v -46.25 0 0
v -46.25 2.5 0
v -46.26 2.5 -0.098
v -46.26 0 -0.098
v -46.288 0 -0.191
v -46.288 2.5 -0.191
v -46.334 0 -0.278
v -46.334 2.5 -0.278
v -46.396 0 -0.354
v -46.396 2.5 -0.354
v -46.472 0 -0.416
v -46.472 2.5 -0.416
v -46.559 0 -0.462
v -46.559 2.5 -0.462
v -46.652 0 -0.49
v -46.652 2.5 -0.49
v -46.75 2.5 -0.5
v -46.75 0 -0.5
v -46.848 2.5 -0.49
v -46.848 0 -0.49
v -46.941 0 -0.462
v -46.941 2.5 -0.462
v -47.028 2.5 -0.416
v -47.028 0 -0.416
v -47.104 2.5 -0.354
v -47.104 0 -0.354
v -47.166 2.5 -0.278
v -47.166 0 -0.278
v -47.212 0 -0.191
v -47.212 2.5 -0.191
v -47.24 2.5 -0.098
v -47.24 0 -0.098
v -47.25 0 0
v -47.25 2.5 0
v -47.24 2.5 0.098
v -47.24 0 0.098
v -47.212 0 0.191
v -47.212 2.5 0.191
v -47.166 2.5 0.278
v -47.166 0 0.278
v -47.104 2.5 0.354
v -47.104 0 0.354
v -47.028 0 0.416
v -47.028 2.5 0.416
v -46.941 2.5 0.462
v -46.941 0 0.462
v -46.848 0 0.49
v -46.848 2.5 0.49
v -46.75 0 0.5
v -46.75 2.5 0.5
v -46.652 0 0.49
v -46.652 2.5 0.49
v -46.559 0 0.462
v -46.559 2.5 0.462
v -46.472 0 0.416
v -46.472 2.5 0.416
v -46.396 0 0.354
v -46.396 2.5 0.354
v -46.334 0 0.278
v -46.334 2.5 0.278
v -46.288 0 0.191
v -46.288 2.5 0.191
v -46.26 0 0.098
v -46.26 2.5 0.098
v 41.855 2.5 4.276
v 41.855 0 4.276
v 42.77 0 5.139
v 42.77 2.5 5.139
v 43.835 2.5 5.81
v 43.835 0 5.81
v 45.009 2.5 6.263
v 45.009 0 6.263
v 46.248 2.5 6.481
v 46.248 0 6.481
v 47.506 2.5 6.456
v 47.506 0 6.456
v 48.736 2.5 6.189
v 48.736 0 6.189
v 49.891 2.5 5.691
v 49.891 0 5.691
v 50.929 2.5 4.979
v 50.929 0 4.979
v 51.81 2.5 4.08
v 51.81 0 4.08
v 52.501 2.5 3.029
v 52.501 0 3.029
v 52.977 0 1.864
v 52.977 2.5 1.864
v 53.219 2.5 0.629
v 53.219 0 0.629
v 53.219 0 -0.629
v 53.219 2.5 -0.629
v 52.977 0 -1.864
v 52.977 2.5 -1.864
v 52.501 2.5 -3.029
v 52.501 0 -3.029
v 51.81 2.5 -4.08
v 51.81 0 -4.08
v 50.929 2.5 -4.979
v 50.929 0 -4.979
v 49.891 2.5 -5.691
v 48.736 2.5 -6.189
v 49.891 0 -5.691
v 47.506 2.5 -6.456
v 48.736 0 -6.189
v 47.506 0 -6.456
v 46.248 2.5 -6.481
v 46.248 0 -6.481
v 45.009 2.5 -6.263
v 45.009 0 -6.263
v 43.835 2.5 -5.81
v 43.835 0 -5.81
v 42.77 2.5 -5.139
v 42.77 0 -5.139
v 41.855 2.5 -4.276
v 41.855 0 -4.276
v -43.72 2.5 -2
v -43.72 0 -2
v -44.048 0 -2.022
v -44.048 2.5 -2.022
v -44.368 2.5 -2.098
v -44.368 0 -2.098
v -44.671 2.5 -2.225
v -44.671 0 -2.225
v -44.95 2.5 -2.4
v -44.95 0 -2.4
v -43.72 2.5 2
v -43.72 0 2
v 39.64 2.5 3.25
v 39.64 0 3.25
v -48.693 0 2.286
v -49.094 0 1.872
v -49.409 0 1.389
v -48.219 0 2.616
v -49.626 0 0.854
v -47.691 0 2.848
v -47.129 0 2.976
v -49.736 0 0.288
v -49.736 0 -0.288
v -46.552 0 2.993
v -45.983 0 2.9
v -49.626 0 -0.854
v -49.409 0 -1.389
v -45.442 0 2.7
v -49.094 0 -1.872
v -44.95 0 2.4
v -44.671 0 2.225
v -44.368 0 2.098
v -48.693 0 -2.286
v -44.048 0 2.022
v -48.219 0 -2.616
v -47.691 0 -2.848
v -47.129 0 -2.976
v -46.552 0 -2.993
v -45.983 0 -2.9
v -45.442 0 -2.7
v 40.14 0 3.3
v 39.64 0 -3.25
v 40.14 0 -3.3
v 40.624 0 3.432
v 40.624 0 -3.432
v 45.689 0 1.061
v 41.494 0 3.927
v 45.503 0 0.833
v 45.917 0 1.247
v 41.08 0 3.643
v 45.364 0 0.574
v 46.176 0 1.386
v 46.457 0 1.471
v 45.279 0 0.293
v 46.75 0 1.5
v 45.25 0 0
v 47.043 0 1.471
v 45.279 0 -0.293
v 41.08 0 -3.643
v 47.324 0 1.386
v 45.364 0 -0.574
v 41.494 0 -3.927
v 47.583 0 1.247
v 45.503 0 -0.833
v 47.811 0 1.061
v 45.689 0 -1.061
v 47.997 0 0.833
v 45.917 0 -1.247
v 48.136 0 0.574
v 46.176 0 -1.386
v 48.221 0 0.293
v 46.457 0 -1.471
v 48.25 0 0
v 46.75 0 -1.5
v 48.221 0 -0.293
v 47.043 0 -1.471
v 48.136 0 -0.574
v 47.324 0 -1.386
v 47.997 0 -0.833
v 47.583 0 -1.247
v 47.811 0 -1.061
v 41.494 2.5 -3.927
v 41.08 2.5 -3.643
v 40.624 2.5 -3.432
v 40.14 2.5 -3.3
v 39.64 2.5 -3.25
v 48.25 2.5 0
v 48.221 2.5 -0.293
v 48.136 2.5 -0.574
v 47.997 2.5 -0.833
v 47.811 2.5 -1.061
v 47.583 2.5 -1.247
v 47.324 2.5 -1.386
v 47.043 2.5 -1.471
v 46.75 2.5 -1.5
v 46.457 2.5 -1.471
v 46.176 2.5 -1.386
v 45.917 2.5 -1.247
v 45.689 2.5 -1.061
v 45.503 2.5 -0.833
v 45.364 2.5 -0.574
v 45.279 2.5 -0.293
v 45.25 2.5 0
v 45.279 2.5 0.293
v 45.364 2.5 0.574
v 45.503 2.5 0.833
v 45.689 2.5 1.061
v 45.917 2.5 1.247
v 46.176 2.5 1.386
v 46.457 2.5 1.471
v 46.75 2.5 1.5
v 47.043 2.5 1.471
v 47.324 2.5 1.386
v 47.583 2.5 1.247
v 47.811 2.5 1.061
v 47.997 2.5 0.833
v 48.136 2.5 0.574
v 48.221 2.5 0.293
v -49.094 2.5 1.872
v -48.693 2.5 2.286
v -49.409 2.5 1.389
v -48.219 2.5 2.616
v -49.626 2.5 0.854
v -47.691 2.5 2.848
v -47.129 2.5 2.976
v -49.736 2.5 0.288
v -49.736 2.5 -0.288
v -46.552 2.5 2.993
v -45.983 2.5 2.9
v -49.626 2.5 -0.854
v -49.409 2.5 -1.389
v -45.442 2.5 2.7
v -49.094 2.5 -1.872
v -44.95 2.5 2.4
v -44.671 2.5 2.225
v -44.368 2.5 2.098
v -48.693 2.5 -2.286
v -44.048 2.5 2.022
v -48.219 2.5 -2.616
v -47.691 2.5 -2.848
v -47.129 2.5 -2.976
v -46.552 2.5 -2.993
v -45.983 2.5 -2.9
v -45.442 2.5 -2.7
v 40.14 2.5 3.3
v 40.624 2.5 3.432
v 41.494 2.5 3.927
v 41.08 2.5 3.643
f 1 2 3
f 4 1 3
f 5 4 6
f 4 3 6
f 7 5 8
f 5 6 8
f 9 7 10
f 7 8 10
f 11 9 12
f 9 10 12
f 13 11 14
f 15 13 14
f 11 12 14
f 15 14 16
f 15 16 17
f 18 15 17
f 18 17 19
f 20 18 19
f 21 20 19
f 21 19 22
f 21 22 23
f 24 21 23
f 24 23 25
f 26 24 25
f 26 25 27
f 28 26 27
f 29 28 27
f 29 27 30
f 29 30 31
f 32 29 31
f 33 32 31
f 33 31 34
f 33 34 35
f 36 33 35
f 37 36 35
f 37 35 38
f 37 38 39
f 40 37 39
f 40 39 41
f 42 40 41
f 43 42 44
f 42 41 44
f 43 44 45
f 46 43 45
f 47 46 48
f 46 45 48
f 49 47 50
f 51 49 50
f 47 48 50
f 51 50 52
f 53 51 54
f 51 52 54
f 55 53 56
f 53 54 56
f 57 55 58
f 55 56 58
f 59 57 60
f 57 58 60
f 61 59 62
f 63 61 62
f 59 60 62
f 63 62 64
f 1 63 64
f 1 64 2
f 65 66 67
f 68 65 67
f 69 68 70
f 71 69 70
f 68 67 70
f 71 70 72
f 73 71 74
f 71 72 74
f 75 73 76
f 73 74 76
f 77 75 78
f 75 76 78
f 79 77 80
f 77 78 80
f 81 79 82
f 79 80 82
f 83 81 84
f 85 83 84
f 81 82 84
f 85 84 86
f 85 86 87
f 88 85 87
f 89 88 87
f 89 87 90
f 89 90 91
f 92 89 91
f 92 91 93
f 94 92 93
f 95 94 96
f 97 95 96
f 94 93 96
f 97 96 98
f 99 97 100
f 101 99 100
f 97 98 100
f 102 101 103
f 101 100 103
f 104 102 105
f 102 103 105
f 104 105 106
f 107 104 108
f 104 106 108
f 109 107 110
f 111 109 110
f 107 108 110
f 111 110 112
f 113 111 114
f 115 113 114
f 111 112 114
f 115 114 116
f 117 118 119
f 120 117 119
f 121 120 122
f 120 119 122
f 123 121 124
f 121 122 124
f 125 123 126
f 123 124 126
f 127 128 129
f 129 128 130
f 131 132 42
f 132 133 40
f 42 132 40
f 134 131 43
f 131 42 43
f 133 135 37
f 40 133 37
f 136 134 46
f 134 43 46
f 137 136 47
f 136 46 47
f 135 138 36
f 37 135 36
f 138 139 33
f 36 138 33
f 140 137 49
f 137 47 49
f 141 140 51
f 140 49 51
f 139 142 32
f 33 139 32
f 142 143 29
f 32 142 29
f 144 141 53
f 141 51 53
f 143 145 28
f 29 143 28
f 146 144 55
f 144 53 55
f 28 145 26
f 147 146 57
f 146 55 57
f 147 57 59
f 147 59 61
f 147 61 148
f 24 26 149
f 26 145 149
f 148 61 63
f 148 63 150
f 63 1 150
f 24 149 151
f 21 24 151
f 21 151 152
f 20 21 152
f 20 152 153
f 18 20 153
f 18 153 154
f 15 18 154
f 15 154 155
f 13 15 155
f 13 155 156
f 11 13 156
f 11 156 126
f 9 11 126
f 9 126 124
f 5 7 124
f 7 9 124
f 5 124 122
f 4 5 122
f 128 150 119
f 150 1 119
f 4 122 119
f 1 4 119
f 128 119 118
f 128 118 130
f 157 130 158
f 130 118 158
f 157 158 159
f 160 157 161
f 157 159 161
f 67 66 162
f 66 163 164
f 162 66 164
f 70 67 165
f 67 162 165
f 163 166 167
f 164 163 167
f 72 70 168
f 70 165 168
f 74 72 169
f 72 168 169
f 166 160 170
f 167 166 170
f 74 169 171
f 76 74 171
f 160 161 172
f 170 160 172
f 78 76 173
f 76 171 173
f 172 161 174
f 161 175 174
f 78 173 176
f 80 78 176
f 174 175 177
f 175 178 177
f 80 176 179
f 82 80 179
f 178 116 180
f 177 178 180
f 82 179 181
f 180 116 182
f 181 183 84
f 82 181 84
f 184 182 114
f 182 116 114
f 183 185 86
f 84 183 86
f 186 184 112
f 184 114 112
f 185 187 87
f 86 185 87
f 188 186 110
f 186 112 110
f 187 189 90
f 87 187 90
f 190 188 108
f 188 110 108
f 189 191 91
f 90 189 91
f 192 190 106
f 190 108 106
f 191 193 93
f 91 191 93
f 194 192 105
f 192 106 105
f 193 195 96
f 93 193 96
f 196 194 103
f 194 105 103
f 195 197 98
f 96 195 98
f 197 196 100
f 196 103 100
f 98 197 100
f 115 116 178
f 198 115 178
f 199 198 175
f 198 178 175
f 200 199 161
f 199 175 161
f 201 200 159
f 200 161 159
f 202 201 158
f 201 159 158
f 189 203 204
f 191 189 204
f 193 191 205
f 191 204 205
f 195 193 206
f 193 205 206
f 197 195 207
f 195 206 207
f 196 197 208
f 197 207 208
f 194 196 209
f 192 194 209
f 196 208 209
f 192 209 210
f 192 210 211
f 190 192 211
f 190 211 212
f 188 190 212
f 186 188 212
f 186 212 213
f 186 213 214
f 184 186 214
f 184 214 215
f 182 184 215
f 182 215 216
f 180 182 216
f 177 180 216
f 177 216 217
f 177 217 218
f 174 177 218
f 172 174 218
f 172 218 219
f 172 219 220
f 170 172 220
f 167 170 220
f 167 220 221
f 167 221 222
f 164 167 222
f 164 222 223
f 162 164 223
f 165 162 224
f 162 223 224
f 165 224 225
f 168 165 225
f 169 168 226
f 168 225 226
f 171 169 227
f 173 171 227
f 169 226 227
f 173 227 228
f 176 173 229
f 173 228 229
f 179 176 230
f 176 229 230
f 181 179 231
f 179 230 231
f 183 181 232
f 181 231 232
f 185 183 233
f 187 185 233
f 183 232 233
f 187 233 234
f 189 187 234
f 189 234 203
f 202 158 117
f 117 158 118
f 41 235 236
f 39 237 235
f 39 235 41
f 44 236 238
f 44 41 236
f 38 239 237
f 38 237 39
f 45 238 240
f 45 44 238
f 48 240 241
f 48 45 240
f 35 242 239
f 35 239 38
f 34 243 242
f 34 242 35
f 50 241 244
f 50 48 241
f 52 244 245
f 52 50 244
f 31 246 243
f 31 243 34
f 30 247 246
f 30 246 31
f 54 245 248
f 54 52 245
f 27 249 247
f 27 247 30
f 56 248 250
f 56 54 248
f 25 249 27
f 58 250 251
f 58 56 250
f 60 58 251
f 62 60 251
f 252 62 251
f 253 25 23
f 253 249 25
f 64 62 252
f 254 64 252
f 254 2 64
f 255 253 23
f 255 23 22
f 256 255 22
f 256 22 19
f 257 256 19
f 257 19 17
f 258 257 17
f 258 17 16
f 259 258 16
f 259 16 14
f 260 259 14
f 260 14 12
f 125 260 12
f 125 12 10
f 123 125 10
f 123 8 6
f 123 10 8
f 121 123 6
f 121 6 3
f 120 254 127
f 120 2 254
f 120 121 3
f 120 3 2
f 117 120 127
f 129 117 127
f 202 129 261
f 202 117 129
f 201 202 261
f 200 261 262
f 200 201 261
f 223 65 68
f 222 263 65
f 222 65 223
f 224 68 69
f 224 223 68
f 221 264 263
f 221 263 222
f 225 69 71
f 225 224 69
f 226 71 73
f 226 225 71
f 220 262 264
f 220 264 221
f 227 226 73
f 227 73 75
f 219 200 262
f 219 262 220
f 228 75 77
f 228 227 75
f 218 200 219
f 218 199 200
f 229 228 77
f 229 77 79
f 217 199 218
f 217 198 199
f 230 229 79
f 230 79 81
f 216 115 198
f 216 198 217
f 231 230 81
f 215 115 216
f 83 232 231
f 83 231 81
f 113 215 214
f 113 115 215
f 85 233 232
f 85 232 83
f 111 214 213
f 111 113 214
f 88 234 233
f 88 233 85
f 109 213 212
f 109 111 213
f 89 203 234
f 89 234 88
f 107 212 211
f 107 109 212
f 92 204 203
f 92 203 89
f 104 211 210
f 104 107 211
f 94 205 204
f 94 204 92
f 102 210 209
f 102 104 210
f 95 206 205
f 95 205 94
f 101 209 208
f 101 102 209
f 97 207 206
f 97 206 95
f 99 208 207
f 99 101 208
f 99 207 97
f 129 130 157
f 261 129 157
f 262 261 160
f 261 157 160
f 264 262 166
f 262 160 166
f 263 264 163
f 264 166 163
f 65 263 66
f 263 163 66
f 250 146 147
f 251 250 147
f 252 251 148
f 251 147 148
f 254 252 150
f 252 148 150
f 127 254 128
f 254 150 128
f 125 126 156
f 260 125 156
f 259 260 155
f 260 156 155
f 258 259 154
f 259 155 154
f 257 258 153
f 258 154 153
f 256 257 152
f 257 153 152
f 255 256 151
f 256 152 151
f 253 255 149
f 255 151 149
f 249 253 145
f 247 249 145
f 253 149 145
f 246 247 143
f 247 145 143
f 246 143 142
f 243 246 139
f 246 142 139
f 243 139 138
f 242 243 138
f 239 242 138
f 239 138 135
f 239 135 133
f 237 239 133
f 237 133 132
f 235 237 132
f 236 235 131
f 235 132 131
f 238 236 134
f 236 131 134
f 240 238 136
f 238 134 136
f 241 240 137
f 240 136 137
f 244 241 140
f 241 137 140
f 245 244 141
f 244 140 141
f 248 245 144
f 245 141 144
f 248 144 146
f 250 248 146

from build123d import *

# Parameters (mm, degrees)
BOSS_EXTRUDE1_DEPTH = 2.5
CUT_EXTRUDE1_REACH  = 4.5
SKETCH2_R           = 0.5
SKETCH2_R_2         = 1.5


with BuildPart() as part:
    # Sketch1 → Boss-Extrude1 (new body)
    with BuildSketch(Plane(origin=(0, 0, 0), x_dir=(1, 0, 0), z_dir=(0, 1, 0))):
        with BuildLine():
            Line((39.640142036, 3.25), (-43.719713181, 2))
            ThreePointArc((-43.719713181, 2), (-44.367984766, 2.097743563), (-44.949820159, 2.399865109))
            ThreePointArc((-44.949820159, 2.399865109), (-49.75, 0), (-44.949820159, -2.399865109))
            ThreePointArc((-44.949820159, -2.399865109), (-44.367984766, -2.097743563), (-43.719713181, -2))
            Line((-43.719713181, -2), (39.640142036, -3.25))
            ThreePointArc((39.640142036, -3.25), (40.856423208, -3.52767477), (41.854584123, -4.276085054))
            ThreePointArc((41.854584123, -4.276085054), (53.25, 0), (41.854584123, 4.276085054))
            ThreePointArc((41.854584123, 4.276085054), (40.856423208, 3.52767477), (39.640142036, 3.25))
        make_face()
    extrude(amount=BOSS_EXTRUDE1_DEPTH)

    # Sketch2 → Cut-Extrude1 (cut, up to next)
    with BuildSketch(Plane(origin=(0, 2.5, 0), x_dir=(1, 0, 0), z_dir=(0, 1, 0)), mode=Mode.PRIVATE) as cut_extrude1_sk1:
        with Locations((-46.75, 0)):
            Circle(SKETCH2_R)
    cut_extrude1_tool1 = extrude(cut_extrude1_sk1.sketch, amount=-CUT_EXTRUDE1_REACH, mode=Mode.PRIVATE) & part.part
    add(cut_extrude1_tool1.solids().sort_by_distance((-46.75, 2.5, 0))[0], mode=Mode.SUBTRACT)
    # Sketch2 → Cut-Extrude1 (cut, up to next)
    with BuildSketch(Plane(origin=(0, 2.5, 0), x_dir=(1, 0, 0), z_dir=(0, 1, 0)), mode=Mode.PRIVATE) as cut_extrude1_sk2:
        with Locations((46.75, 0)):
            Circle(SKETCH2_R_2)
    cut_extrude1_tool2 = extrude(cut_extrude1_sk2.sketch, amount=-CUT_EXTRUDE1_REACH, mode=Mode.PRIVATE) & part.part
    add(cut_extrude1_tool2.solids().sort_by_distance((46.75, 2.5, 0))[0], mode=Mode.SUBTRACT)


solid = part.part
